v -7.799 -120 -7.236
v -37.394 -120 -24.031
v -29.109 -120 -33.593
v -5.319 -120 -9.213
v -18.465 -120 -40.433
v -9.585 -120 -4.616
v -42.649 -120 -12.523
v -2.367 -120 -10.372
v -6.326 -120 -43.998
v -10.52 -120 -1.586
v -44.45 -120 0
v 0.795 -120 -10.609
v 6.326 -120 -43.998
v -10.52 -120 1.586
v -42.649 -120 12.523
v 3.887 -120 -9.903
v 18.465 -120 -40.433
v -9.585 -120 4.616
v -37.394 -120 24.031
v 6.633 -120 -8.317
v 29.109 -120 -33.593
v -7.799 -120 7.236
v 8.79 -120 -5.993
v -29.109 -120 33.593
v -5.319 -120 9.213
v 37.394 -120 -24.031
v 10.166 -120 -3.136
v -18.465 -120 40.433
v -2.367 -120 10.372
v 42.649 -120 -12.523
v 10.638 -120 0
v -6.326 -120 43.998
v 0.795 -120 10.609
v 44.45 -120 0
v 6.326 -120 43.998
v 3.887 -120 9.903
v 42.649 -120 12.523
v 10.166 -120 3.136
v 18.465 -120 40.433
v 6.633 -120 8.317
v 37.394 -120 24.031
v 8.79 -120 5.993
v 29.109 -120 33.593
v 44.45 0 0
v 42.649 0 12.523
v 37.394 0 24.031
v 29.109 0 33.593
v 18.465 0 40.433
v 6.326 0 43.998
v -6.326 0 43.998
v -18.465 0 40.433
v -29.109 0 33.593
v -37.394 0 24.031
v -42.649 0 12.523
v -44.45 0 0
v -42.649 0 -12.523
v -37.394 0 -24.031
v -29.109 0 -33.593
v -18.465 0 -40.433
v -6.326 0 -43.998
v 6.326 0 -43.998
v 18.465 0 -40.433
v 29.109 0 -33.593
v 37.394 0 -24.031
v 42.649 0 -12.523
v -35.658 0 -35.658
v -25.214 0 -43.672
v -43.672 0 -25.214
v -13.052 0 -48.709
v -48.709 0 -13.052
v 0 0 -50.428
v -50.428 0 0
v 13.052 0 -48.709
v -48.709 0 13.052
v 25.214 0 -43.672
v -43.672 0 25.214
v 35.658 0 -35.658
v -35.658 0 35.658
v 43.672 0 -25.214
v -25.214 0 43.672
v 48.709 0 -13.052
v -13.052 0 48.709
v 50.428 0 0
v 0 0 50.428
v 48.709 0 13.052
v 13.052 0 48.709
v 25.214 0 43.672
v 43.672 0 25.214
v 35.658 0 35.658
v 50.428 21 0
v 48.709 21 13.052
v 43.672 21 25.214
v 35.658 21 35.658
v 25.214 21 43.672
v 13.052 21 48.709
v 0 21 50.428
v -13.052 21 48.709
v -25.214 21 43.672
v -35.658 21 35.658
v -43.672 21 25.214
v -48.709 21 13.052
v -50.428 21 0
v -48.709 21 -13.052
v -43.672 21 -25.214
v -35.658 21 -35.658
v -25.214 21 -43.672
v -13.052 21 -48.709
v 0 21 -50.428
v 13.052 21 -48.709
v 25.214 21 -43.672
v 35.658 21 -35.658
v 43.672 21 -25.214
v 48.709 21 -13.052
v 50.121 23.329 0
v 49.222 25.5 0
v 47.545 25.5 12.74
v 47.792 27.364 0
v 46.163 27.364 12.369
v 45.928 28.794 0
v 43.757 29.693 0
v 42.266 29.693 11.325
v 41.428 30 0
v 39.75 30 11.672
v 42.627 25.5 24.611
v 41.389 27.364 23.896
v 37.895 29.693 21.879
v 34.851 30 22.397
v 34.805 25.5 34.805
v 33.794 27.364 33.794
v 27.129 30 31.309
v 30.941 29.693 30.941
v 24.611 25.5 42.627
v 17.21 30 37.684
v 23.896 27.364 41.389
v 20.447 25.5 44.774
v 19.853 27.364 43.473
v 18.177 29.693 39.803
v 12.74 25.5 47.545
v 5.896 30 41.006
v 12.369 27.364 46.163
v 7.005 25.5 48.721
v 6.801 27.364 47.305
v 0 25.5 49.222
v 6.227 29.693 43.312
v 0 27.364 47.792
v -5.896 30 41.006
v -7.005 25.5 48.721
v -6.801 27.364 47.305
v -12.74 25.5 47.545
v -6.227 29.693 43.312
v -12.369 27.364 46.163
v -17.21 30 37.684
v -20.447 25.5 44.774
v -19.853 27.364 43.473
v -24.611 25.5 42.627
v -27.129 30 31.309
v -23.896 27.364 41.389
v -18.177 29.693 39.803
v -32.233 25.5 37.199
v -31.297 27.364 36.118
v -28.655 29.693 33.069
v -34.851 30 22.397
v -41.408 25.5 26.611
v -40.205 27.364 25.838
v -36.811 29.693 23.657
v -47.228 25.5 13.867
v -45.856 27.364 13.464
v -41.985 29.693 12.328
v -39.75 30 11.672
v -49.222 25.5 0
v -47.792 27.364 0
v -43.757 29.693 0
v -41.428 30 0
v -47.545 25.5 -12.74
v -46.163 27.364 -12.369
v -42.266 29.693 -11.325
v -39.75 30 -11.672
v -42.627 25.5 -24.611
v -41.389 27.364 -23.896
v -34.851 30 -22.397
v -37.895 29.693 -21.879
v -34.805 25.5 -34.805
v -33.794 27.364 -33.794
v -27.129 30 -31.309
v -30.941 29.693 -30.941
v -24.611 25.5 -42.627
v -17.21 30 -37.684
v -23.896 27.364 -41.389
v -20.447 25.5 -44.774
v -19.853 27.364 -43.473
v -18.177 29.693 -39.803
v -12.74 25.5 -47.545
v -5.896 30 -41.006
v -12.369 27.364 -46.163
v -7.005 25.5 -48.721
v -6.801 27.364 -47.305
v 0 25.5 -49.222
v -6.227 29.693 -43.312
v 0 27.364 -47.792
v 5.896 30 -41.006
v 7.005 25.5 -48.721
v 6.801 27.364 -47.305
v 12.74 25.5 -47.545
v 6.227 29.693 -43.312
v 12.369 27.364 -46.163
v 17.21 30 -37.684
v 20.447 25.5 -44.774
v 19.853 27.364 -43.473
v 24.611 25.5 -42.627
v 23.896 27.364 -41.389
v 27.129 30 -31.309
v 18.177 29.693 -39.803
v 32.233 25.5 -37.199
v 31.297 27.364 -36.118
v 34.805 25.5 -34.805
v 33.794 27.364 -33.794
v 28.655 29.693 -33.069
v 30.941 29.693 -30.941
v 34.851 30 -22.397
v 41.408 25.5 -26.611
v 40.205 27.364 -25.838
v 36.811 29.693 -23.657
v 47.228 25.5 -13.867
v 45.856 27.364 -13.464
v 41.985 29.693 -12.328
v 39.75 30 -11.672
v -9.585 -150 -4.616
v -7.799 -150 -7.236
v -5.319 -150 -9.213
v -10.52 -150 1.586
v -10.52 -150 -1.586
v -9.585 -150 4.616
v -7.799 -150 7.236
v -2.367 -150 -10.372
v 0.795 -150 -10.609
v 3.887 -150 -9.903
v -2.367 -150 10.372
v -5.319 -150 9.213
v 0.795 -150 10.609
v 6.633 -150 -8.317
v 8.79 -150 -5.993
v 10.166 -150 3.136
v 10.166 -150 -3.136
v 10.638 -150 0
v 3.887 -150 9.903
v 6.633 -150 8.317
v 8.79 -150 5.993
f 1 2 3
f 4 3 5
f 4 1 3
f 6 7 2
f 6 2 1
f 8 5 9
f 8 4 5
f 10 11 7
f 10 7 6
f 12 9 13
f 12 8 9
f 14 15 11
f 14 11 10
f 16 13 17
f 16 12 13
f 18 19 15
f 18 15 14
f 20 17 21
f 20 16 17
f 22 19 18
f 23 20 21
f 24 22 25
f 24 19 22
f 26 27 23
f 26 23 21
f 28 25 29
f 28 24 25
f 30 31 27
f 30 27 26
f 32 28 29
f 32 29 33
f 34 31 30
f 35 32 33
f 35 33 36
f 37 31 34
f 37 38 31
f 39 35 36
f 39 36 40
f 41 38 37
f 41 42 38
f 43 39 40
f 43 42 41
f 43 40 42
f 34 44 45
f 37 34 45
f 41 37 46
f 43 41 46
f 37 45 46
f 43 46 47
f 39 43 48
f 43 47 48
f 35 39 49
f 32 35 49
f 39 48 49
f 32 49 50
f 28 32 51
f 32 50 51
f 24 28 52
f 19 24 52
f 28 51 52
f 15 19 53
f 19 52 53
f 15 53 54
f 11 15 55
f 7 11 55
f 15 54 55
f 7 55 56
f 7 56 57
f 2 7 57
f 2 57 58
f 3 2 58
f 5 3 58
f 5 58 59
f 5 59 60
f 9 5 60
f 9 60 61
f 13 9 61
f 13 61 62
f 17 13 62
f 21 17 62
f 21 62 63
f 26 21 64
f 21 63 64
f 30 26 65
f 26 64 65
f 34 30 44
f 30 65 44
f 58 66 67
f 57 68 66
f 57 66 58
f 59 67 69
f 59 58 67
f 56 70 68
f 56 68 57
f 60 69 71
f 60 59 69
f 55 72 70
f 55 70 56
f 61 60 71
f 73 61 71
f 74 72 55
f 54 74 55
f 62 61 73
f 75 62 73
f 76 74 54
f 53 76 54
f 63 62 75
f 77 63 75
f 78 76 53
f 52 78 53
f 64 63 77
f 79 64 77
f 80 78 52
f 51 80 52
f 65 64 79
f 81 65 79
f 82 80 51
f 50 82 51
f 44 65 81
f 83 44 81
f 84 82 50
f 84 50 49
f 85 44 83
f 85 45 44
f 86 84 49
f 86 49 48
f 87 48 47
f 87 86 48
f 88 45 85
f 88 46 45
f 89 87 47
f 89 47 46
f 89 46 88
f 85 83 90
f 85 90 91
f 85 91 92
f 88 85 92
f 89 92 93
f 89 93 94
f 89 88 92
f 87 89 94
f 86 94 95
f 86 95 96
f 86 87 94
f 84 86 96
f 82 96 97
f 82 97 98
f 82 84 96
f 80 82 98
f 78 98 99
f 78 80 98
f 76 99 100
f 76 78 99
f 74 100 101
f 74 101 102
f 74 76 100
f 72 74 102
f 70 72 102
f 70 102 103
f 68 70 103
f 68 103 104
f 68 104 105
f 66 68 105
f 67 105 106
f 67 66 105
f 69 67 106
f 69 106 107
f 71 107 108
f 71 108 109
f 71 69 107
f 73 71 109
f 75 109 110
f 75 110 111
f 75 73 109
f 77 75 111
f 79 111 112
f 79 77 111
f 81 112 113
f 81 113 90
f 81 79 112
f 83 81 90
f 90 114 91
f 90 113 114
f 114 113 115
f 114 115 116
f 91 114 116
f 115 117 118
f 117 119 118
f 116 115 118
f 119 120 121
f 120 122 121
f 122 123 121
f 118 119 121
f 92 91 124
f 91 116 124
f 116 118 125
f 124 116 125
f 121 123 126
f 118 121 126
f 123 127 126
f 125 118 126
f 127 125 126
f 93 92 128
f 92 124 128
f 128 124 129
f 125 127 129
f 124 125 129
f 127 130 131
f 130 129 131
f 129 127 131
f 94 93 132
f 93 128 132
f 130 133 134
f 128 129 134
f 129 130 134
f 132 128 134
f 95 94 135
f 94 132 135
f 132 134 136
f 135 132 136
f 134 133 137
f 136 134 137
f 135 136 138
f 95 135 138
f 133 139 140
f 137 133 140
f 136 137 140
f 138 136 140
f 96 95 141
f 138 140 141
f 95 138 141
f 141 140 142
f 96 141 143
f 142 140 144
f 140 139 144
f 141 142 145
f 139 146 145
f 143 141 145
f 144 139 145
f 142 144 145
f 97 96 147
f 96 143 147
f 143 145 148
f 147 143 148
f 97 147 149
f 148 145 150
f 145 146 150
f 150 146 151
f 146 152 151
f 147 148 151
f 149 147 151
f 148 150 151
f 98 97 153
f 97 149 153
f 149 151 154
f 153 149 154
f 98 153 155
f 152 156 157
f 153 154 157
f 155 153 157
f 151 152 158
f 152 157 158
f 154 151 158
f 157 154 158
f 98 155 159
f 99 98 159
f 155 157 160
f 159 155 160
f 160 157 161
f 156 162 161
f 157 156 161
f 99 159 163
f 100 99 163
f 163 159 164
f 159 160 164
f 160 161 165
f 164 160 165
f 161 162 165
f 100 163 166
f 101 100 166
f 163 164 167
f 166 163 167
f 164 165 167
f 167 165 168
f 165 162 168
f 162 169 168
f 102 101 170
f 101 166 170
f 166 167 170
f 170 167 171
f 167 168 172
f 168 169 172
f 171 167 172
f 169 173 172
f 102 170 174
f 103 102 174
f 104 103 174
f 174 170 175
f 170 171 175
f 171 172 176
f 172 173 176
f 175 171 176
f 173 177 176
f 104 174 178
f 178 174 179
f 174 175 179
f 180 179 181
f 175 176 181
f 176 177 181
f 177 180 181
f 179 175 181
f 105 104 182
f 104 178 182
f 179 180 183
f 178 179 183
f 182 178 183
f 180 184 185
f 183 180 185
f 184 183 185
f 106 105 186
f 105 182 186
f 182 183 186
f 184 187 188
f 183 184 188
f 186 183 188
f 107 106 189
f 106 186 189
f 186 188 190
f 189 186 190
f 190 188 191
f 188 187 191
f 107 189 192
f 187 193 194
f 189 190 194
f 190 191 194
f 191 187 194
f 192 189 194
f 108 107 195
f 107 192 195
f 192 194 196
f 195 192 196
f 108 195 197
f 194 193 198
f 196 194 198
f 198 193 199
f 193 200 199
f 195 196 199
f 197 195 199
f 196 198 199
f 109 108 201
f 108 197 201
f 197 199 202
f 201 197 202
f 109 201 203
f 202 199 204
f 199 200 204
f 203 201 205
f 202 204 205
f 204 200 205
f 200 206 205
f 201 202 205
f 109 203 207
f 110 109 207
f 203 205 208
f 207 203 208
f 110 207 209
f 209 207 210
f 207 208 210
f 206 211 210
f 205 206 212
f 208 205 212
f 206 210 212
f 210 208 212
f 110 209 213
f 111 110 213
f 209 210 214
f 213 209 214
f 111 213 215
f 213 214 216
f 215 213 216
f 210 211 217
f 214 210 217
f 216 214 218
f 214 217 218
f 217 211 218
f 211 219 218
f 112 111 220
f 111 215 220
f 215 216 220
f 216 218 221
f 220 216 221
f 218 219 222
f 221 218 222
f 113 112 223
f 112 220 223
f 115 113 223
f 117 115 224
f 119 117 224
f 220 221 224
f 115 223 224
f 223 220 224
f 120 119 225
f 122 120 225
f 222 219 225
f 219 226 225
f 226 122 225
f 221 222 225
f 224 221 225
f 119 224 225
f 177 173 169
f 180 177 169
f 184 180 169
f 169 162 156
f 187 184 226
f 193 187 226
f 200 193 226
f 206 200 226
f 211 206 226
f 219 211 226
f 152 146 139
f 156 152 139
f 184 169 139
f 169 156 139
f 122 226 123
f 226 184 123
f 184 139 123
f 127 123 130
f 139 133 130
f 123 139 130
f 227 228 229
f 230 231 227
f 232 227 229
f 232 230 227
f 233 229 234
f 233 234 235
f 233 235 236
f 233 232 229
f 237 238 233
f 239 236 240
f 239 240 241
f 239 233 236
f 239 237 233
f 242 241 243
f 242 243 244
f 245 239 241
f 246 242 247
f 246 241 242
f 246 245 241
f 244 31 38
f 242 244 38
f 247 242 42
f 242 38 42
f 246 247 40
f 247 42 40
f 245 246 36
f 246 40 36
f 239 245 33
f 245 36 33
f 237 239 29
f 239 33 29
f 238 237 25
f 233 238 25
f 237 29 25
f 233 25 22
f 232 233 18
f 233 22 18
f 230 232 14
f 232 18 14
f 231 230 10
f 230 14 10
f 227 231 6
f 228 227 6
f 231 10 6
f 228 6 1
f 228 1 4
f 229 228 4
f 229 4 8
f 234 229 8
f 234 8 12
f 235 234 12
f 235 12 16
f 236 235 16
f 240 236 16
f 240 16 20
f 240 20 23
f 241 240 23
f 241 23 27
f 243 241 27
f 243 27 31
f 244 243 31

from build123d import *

# Parameters (mm, degrees)
F0_R     = 44.45
F1_DEPTH = 120
F2_R     = 50.427629
F3_DEPTH = 30
F4_R     = 9
F5_R     = 10.638423
F6_DEPTH = 150


with BuildPart() as f1:
    # F0 (on Front) → F1 (new body)
    with BuildSketch(Plane.XZ):
        Circle(F0_R)
    extrude(amount=F1_DEPTH)

    # F2 (on Front) → F3 (join)
    with BuildSketch(Plane.XZ):
        Circle(F2_R)
    extrude(amount=-F3_DEPTH)

    # F4
    f4_edges = [f1.edges().sort_by_distance(p)[0] for p in [
        (-50.427629, 30, 0),
    ]]
    fillet(f4_edges, radius=F4_R)

    # F5 (on Front) → F6 (join)
    with BuildSketch(Plane.XZ):
        Circle(F5_R)
    extrude(amount=F6_DEPTH)


solid = f1.part
